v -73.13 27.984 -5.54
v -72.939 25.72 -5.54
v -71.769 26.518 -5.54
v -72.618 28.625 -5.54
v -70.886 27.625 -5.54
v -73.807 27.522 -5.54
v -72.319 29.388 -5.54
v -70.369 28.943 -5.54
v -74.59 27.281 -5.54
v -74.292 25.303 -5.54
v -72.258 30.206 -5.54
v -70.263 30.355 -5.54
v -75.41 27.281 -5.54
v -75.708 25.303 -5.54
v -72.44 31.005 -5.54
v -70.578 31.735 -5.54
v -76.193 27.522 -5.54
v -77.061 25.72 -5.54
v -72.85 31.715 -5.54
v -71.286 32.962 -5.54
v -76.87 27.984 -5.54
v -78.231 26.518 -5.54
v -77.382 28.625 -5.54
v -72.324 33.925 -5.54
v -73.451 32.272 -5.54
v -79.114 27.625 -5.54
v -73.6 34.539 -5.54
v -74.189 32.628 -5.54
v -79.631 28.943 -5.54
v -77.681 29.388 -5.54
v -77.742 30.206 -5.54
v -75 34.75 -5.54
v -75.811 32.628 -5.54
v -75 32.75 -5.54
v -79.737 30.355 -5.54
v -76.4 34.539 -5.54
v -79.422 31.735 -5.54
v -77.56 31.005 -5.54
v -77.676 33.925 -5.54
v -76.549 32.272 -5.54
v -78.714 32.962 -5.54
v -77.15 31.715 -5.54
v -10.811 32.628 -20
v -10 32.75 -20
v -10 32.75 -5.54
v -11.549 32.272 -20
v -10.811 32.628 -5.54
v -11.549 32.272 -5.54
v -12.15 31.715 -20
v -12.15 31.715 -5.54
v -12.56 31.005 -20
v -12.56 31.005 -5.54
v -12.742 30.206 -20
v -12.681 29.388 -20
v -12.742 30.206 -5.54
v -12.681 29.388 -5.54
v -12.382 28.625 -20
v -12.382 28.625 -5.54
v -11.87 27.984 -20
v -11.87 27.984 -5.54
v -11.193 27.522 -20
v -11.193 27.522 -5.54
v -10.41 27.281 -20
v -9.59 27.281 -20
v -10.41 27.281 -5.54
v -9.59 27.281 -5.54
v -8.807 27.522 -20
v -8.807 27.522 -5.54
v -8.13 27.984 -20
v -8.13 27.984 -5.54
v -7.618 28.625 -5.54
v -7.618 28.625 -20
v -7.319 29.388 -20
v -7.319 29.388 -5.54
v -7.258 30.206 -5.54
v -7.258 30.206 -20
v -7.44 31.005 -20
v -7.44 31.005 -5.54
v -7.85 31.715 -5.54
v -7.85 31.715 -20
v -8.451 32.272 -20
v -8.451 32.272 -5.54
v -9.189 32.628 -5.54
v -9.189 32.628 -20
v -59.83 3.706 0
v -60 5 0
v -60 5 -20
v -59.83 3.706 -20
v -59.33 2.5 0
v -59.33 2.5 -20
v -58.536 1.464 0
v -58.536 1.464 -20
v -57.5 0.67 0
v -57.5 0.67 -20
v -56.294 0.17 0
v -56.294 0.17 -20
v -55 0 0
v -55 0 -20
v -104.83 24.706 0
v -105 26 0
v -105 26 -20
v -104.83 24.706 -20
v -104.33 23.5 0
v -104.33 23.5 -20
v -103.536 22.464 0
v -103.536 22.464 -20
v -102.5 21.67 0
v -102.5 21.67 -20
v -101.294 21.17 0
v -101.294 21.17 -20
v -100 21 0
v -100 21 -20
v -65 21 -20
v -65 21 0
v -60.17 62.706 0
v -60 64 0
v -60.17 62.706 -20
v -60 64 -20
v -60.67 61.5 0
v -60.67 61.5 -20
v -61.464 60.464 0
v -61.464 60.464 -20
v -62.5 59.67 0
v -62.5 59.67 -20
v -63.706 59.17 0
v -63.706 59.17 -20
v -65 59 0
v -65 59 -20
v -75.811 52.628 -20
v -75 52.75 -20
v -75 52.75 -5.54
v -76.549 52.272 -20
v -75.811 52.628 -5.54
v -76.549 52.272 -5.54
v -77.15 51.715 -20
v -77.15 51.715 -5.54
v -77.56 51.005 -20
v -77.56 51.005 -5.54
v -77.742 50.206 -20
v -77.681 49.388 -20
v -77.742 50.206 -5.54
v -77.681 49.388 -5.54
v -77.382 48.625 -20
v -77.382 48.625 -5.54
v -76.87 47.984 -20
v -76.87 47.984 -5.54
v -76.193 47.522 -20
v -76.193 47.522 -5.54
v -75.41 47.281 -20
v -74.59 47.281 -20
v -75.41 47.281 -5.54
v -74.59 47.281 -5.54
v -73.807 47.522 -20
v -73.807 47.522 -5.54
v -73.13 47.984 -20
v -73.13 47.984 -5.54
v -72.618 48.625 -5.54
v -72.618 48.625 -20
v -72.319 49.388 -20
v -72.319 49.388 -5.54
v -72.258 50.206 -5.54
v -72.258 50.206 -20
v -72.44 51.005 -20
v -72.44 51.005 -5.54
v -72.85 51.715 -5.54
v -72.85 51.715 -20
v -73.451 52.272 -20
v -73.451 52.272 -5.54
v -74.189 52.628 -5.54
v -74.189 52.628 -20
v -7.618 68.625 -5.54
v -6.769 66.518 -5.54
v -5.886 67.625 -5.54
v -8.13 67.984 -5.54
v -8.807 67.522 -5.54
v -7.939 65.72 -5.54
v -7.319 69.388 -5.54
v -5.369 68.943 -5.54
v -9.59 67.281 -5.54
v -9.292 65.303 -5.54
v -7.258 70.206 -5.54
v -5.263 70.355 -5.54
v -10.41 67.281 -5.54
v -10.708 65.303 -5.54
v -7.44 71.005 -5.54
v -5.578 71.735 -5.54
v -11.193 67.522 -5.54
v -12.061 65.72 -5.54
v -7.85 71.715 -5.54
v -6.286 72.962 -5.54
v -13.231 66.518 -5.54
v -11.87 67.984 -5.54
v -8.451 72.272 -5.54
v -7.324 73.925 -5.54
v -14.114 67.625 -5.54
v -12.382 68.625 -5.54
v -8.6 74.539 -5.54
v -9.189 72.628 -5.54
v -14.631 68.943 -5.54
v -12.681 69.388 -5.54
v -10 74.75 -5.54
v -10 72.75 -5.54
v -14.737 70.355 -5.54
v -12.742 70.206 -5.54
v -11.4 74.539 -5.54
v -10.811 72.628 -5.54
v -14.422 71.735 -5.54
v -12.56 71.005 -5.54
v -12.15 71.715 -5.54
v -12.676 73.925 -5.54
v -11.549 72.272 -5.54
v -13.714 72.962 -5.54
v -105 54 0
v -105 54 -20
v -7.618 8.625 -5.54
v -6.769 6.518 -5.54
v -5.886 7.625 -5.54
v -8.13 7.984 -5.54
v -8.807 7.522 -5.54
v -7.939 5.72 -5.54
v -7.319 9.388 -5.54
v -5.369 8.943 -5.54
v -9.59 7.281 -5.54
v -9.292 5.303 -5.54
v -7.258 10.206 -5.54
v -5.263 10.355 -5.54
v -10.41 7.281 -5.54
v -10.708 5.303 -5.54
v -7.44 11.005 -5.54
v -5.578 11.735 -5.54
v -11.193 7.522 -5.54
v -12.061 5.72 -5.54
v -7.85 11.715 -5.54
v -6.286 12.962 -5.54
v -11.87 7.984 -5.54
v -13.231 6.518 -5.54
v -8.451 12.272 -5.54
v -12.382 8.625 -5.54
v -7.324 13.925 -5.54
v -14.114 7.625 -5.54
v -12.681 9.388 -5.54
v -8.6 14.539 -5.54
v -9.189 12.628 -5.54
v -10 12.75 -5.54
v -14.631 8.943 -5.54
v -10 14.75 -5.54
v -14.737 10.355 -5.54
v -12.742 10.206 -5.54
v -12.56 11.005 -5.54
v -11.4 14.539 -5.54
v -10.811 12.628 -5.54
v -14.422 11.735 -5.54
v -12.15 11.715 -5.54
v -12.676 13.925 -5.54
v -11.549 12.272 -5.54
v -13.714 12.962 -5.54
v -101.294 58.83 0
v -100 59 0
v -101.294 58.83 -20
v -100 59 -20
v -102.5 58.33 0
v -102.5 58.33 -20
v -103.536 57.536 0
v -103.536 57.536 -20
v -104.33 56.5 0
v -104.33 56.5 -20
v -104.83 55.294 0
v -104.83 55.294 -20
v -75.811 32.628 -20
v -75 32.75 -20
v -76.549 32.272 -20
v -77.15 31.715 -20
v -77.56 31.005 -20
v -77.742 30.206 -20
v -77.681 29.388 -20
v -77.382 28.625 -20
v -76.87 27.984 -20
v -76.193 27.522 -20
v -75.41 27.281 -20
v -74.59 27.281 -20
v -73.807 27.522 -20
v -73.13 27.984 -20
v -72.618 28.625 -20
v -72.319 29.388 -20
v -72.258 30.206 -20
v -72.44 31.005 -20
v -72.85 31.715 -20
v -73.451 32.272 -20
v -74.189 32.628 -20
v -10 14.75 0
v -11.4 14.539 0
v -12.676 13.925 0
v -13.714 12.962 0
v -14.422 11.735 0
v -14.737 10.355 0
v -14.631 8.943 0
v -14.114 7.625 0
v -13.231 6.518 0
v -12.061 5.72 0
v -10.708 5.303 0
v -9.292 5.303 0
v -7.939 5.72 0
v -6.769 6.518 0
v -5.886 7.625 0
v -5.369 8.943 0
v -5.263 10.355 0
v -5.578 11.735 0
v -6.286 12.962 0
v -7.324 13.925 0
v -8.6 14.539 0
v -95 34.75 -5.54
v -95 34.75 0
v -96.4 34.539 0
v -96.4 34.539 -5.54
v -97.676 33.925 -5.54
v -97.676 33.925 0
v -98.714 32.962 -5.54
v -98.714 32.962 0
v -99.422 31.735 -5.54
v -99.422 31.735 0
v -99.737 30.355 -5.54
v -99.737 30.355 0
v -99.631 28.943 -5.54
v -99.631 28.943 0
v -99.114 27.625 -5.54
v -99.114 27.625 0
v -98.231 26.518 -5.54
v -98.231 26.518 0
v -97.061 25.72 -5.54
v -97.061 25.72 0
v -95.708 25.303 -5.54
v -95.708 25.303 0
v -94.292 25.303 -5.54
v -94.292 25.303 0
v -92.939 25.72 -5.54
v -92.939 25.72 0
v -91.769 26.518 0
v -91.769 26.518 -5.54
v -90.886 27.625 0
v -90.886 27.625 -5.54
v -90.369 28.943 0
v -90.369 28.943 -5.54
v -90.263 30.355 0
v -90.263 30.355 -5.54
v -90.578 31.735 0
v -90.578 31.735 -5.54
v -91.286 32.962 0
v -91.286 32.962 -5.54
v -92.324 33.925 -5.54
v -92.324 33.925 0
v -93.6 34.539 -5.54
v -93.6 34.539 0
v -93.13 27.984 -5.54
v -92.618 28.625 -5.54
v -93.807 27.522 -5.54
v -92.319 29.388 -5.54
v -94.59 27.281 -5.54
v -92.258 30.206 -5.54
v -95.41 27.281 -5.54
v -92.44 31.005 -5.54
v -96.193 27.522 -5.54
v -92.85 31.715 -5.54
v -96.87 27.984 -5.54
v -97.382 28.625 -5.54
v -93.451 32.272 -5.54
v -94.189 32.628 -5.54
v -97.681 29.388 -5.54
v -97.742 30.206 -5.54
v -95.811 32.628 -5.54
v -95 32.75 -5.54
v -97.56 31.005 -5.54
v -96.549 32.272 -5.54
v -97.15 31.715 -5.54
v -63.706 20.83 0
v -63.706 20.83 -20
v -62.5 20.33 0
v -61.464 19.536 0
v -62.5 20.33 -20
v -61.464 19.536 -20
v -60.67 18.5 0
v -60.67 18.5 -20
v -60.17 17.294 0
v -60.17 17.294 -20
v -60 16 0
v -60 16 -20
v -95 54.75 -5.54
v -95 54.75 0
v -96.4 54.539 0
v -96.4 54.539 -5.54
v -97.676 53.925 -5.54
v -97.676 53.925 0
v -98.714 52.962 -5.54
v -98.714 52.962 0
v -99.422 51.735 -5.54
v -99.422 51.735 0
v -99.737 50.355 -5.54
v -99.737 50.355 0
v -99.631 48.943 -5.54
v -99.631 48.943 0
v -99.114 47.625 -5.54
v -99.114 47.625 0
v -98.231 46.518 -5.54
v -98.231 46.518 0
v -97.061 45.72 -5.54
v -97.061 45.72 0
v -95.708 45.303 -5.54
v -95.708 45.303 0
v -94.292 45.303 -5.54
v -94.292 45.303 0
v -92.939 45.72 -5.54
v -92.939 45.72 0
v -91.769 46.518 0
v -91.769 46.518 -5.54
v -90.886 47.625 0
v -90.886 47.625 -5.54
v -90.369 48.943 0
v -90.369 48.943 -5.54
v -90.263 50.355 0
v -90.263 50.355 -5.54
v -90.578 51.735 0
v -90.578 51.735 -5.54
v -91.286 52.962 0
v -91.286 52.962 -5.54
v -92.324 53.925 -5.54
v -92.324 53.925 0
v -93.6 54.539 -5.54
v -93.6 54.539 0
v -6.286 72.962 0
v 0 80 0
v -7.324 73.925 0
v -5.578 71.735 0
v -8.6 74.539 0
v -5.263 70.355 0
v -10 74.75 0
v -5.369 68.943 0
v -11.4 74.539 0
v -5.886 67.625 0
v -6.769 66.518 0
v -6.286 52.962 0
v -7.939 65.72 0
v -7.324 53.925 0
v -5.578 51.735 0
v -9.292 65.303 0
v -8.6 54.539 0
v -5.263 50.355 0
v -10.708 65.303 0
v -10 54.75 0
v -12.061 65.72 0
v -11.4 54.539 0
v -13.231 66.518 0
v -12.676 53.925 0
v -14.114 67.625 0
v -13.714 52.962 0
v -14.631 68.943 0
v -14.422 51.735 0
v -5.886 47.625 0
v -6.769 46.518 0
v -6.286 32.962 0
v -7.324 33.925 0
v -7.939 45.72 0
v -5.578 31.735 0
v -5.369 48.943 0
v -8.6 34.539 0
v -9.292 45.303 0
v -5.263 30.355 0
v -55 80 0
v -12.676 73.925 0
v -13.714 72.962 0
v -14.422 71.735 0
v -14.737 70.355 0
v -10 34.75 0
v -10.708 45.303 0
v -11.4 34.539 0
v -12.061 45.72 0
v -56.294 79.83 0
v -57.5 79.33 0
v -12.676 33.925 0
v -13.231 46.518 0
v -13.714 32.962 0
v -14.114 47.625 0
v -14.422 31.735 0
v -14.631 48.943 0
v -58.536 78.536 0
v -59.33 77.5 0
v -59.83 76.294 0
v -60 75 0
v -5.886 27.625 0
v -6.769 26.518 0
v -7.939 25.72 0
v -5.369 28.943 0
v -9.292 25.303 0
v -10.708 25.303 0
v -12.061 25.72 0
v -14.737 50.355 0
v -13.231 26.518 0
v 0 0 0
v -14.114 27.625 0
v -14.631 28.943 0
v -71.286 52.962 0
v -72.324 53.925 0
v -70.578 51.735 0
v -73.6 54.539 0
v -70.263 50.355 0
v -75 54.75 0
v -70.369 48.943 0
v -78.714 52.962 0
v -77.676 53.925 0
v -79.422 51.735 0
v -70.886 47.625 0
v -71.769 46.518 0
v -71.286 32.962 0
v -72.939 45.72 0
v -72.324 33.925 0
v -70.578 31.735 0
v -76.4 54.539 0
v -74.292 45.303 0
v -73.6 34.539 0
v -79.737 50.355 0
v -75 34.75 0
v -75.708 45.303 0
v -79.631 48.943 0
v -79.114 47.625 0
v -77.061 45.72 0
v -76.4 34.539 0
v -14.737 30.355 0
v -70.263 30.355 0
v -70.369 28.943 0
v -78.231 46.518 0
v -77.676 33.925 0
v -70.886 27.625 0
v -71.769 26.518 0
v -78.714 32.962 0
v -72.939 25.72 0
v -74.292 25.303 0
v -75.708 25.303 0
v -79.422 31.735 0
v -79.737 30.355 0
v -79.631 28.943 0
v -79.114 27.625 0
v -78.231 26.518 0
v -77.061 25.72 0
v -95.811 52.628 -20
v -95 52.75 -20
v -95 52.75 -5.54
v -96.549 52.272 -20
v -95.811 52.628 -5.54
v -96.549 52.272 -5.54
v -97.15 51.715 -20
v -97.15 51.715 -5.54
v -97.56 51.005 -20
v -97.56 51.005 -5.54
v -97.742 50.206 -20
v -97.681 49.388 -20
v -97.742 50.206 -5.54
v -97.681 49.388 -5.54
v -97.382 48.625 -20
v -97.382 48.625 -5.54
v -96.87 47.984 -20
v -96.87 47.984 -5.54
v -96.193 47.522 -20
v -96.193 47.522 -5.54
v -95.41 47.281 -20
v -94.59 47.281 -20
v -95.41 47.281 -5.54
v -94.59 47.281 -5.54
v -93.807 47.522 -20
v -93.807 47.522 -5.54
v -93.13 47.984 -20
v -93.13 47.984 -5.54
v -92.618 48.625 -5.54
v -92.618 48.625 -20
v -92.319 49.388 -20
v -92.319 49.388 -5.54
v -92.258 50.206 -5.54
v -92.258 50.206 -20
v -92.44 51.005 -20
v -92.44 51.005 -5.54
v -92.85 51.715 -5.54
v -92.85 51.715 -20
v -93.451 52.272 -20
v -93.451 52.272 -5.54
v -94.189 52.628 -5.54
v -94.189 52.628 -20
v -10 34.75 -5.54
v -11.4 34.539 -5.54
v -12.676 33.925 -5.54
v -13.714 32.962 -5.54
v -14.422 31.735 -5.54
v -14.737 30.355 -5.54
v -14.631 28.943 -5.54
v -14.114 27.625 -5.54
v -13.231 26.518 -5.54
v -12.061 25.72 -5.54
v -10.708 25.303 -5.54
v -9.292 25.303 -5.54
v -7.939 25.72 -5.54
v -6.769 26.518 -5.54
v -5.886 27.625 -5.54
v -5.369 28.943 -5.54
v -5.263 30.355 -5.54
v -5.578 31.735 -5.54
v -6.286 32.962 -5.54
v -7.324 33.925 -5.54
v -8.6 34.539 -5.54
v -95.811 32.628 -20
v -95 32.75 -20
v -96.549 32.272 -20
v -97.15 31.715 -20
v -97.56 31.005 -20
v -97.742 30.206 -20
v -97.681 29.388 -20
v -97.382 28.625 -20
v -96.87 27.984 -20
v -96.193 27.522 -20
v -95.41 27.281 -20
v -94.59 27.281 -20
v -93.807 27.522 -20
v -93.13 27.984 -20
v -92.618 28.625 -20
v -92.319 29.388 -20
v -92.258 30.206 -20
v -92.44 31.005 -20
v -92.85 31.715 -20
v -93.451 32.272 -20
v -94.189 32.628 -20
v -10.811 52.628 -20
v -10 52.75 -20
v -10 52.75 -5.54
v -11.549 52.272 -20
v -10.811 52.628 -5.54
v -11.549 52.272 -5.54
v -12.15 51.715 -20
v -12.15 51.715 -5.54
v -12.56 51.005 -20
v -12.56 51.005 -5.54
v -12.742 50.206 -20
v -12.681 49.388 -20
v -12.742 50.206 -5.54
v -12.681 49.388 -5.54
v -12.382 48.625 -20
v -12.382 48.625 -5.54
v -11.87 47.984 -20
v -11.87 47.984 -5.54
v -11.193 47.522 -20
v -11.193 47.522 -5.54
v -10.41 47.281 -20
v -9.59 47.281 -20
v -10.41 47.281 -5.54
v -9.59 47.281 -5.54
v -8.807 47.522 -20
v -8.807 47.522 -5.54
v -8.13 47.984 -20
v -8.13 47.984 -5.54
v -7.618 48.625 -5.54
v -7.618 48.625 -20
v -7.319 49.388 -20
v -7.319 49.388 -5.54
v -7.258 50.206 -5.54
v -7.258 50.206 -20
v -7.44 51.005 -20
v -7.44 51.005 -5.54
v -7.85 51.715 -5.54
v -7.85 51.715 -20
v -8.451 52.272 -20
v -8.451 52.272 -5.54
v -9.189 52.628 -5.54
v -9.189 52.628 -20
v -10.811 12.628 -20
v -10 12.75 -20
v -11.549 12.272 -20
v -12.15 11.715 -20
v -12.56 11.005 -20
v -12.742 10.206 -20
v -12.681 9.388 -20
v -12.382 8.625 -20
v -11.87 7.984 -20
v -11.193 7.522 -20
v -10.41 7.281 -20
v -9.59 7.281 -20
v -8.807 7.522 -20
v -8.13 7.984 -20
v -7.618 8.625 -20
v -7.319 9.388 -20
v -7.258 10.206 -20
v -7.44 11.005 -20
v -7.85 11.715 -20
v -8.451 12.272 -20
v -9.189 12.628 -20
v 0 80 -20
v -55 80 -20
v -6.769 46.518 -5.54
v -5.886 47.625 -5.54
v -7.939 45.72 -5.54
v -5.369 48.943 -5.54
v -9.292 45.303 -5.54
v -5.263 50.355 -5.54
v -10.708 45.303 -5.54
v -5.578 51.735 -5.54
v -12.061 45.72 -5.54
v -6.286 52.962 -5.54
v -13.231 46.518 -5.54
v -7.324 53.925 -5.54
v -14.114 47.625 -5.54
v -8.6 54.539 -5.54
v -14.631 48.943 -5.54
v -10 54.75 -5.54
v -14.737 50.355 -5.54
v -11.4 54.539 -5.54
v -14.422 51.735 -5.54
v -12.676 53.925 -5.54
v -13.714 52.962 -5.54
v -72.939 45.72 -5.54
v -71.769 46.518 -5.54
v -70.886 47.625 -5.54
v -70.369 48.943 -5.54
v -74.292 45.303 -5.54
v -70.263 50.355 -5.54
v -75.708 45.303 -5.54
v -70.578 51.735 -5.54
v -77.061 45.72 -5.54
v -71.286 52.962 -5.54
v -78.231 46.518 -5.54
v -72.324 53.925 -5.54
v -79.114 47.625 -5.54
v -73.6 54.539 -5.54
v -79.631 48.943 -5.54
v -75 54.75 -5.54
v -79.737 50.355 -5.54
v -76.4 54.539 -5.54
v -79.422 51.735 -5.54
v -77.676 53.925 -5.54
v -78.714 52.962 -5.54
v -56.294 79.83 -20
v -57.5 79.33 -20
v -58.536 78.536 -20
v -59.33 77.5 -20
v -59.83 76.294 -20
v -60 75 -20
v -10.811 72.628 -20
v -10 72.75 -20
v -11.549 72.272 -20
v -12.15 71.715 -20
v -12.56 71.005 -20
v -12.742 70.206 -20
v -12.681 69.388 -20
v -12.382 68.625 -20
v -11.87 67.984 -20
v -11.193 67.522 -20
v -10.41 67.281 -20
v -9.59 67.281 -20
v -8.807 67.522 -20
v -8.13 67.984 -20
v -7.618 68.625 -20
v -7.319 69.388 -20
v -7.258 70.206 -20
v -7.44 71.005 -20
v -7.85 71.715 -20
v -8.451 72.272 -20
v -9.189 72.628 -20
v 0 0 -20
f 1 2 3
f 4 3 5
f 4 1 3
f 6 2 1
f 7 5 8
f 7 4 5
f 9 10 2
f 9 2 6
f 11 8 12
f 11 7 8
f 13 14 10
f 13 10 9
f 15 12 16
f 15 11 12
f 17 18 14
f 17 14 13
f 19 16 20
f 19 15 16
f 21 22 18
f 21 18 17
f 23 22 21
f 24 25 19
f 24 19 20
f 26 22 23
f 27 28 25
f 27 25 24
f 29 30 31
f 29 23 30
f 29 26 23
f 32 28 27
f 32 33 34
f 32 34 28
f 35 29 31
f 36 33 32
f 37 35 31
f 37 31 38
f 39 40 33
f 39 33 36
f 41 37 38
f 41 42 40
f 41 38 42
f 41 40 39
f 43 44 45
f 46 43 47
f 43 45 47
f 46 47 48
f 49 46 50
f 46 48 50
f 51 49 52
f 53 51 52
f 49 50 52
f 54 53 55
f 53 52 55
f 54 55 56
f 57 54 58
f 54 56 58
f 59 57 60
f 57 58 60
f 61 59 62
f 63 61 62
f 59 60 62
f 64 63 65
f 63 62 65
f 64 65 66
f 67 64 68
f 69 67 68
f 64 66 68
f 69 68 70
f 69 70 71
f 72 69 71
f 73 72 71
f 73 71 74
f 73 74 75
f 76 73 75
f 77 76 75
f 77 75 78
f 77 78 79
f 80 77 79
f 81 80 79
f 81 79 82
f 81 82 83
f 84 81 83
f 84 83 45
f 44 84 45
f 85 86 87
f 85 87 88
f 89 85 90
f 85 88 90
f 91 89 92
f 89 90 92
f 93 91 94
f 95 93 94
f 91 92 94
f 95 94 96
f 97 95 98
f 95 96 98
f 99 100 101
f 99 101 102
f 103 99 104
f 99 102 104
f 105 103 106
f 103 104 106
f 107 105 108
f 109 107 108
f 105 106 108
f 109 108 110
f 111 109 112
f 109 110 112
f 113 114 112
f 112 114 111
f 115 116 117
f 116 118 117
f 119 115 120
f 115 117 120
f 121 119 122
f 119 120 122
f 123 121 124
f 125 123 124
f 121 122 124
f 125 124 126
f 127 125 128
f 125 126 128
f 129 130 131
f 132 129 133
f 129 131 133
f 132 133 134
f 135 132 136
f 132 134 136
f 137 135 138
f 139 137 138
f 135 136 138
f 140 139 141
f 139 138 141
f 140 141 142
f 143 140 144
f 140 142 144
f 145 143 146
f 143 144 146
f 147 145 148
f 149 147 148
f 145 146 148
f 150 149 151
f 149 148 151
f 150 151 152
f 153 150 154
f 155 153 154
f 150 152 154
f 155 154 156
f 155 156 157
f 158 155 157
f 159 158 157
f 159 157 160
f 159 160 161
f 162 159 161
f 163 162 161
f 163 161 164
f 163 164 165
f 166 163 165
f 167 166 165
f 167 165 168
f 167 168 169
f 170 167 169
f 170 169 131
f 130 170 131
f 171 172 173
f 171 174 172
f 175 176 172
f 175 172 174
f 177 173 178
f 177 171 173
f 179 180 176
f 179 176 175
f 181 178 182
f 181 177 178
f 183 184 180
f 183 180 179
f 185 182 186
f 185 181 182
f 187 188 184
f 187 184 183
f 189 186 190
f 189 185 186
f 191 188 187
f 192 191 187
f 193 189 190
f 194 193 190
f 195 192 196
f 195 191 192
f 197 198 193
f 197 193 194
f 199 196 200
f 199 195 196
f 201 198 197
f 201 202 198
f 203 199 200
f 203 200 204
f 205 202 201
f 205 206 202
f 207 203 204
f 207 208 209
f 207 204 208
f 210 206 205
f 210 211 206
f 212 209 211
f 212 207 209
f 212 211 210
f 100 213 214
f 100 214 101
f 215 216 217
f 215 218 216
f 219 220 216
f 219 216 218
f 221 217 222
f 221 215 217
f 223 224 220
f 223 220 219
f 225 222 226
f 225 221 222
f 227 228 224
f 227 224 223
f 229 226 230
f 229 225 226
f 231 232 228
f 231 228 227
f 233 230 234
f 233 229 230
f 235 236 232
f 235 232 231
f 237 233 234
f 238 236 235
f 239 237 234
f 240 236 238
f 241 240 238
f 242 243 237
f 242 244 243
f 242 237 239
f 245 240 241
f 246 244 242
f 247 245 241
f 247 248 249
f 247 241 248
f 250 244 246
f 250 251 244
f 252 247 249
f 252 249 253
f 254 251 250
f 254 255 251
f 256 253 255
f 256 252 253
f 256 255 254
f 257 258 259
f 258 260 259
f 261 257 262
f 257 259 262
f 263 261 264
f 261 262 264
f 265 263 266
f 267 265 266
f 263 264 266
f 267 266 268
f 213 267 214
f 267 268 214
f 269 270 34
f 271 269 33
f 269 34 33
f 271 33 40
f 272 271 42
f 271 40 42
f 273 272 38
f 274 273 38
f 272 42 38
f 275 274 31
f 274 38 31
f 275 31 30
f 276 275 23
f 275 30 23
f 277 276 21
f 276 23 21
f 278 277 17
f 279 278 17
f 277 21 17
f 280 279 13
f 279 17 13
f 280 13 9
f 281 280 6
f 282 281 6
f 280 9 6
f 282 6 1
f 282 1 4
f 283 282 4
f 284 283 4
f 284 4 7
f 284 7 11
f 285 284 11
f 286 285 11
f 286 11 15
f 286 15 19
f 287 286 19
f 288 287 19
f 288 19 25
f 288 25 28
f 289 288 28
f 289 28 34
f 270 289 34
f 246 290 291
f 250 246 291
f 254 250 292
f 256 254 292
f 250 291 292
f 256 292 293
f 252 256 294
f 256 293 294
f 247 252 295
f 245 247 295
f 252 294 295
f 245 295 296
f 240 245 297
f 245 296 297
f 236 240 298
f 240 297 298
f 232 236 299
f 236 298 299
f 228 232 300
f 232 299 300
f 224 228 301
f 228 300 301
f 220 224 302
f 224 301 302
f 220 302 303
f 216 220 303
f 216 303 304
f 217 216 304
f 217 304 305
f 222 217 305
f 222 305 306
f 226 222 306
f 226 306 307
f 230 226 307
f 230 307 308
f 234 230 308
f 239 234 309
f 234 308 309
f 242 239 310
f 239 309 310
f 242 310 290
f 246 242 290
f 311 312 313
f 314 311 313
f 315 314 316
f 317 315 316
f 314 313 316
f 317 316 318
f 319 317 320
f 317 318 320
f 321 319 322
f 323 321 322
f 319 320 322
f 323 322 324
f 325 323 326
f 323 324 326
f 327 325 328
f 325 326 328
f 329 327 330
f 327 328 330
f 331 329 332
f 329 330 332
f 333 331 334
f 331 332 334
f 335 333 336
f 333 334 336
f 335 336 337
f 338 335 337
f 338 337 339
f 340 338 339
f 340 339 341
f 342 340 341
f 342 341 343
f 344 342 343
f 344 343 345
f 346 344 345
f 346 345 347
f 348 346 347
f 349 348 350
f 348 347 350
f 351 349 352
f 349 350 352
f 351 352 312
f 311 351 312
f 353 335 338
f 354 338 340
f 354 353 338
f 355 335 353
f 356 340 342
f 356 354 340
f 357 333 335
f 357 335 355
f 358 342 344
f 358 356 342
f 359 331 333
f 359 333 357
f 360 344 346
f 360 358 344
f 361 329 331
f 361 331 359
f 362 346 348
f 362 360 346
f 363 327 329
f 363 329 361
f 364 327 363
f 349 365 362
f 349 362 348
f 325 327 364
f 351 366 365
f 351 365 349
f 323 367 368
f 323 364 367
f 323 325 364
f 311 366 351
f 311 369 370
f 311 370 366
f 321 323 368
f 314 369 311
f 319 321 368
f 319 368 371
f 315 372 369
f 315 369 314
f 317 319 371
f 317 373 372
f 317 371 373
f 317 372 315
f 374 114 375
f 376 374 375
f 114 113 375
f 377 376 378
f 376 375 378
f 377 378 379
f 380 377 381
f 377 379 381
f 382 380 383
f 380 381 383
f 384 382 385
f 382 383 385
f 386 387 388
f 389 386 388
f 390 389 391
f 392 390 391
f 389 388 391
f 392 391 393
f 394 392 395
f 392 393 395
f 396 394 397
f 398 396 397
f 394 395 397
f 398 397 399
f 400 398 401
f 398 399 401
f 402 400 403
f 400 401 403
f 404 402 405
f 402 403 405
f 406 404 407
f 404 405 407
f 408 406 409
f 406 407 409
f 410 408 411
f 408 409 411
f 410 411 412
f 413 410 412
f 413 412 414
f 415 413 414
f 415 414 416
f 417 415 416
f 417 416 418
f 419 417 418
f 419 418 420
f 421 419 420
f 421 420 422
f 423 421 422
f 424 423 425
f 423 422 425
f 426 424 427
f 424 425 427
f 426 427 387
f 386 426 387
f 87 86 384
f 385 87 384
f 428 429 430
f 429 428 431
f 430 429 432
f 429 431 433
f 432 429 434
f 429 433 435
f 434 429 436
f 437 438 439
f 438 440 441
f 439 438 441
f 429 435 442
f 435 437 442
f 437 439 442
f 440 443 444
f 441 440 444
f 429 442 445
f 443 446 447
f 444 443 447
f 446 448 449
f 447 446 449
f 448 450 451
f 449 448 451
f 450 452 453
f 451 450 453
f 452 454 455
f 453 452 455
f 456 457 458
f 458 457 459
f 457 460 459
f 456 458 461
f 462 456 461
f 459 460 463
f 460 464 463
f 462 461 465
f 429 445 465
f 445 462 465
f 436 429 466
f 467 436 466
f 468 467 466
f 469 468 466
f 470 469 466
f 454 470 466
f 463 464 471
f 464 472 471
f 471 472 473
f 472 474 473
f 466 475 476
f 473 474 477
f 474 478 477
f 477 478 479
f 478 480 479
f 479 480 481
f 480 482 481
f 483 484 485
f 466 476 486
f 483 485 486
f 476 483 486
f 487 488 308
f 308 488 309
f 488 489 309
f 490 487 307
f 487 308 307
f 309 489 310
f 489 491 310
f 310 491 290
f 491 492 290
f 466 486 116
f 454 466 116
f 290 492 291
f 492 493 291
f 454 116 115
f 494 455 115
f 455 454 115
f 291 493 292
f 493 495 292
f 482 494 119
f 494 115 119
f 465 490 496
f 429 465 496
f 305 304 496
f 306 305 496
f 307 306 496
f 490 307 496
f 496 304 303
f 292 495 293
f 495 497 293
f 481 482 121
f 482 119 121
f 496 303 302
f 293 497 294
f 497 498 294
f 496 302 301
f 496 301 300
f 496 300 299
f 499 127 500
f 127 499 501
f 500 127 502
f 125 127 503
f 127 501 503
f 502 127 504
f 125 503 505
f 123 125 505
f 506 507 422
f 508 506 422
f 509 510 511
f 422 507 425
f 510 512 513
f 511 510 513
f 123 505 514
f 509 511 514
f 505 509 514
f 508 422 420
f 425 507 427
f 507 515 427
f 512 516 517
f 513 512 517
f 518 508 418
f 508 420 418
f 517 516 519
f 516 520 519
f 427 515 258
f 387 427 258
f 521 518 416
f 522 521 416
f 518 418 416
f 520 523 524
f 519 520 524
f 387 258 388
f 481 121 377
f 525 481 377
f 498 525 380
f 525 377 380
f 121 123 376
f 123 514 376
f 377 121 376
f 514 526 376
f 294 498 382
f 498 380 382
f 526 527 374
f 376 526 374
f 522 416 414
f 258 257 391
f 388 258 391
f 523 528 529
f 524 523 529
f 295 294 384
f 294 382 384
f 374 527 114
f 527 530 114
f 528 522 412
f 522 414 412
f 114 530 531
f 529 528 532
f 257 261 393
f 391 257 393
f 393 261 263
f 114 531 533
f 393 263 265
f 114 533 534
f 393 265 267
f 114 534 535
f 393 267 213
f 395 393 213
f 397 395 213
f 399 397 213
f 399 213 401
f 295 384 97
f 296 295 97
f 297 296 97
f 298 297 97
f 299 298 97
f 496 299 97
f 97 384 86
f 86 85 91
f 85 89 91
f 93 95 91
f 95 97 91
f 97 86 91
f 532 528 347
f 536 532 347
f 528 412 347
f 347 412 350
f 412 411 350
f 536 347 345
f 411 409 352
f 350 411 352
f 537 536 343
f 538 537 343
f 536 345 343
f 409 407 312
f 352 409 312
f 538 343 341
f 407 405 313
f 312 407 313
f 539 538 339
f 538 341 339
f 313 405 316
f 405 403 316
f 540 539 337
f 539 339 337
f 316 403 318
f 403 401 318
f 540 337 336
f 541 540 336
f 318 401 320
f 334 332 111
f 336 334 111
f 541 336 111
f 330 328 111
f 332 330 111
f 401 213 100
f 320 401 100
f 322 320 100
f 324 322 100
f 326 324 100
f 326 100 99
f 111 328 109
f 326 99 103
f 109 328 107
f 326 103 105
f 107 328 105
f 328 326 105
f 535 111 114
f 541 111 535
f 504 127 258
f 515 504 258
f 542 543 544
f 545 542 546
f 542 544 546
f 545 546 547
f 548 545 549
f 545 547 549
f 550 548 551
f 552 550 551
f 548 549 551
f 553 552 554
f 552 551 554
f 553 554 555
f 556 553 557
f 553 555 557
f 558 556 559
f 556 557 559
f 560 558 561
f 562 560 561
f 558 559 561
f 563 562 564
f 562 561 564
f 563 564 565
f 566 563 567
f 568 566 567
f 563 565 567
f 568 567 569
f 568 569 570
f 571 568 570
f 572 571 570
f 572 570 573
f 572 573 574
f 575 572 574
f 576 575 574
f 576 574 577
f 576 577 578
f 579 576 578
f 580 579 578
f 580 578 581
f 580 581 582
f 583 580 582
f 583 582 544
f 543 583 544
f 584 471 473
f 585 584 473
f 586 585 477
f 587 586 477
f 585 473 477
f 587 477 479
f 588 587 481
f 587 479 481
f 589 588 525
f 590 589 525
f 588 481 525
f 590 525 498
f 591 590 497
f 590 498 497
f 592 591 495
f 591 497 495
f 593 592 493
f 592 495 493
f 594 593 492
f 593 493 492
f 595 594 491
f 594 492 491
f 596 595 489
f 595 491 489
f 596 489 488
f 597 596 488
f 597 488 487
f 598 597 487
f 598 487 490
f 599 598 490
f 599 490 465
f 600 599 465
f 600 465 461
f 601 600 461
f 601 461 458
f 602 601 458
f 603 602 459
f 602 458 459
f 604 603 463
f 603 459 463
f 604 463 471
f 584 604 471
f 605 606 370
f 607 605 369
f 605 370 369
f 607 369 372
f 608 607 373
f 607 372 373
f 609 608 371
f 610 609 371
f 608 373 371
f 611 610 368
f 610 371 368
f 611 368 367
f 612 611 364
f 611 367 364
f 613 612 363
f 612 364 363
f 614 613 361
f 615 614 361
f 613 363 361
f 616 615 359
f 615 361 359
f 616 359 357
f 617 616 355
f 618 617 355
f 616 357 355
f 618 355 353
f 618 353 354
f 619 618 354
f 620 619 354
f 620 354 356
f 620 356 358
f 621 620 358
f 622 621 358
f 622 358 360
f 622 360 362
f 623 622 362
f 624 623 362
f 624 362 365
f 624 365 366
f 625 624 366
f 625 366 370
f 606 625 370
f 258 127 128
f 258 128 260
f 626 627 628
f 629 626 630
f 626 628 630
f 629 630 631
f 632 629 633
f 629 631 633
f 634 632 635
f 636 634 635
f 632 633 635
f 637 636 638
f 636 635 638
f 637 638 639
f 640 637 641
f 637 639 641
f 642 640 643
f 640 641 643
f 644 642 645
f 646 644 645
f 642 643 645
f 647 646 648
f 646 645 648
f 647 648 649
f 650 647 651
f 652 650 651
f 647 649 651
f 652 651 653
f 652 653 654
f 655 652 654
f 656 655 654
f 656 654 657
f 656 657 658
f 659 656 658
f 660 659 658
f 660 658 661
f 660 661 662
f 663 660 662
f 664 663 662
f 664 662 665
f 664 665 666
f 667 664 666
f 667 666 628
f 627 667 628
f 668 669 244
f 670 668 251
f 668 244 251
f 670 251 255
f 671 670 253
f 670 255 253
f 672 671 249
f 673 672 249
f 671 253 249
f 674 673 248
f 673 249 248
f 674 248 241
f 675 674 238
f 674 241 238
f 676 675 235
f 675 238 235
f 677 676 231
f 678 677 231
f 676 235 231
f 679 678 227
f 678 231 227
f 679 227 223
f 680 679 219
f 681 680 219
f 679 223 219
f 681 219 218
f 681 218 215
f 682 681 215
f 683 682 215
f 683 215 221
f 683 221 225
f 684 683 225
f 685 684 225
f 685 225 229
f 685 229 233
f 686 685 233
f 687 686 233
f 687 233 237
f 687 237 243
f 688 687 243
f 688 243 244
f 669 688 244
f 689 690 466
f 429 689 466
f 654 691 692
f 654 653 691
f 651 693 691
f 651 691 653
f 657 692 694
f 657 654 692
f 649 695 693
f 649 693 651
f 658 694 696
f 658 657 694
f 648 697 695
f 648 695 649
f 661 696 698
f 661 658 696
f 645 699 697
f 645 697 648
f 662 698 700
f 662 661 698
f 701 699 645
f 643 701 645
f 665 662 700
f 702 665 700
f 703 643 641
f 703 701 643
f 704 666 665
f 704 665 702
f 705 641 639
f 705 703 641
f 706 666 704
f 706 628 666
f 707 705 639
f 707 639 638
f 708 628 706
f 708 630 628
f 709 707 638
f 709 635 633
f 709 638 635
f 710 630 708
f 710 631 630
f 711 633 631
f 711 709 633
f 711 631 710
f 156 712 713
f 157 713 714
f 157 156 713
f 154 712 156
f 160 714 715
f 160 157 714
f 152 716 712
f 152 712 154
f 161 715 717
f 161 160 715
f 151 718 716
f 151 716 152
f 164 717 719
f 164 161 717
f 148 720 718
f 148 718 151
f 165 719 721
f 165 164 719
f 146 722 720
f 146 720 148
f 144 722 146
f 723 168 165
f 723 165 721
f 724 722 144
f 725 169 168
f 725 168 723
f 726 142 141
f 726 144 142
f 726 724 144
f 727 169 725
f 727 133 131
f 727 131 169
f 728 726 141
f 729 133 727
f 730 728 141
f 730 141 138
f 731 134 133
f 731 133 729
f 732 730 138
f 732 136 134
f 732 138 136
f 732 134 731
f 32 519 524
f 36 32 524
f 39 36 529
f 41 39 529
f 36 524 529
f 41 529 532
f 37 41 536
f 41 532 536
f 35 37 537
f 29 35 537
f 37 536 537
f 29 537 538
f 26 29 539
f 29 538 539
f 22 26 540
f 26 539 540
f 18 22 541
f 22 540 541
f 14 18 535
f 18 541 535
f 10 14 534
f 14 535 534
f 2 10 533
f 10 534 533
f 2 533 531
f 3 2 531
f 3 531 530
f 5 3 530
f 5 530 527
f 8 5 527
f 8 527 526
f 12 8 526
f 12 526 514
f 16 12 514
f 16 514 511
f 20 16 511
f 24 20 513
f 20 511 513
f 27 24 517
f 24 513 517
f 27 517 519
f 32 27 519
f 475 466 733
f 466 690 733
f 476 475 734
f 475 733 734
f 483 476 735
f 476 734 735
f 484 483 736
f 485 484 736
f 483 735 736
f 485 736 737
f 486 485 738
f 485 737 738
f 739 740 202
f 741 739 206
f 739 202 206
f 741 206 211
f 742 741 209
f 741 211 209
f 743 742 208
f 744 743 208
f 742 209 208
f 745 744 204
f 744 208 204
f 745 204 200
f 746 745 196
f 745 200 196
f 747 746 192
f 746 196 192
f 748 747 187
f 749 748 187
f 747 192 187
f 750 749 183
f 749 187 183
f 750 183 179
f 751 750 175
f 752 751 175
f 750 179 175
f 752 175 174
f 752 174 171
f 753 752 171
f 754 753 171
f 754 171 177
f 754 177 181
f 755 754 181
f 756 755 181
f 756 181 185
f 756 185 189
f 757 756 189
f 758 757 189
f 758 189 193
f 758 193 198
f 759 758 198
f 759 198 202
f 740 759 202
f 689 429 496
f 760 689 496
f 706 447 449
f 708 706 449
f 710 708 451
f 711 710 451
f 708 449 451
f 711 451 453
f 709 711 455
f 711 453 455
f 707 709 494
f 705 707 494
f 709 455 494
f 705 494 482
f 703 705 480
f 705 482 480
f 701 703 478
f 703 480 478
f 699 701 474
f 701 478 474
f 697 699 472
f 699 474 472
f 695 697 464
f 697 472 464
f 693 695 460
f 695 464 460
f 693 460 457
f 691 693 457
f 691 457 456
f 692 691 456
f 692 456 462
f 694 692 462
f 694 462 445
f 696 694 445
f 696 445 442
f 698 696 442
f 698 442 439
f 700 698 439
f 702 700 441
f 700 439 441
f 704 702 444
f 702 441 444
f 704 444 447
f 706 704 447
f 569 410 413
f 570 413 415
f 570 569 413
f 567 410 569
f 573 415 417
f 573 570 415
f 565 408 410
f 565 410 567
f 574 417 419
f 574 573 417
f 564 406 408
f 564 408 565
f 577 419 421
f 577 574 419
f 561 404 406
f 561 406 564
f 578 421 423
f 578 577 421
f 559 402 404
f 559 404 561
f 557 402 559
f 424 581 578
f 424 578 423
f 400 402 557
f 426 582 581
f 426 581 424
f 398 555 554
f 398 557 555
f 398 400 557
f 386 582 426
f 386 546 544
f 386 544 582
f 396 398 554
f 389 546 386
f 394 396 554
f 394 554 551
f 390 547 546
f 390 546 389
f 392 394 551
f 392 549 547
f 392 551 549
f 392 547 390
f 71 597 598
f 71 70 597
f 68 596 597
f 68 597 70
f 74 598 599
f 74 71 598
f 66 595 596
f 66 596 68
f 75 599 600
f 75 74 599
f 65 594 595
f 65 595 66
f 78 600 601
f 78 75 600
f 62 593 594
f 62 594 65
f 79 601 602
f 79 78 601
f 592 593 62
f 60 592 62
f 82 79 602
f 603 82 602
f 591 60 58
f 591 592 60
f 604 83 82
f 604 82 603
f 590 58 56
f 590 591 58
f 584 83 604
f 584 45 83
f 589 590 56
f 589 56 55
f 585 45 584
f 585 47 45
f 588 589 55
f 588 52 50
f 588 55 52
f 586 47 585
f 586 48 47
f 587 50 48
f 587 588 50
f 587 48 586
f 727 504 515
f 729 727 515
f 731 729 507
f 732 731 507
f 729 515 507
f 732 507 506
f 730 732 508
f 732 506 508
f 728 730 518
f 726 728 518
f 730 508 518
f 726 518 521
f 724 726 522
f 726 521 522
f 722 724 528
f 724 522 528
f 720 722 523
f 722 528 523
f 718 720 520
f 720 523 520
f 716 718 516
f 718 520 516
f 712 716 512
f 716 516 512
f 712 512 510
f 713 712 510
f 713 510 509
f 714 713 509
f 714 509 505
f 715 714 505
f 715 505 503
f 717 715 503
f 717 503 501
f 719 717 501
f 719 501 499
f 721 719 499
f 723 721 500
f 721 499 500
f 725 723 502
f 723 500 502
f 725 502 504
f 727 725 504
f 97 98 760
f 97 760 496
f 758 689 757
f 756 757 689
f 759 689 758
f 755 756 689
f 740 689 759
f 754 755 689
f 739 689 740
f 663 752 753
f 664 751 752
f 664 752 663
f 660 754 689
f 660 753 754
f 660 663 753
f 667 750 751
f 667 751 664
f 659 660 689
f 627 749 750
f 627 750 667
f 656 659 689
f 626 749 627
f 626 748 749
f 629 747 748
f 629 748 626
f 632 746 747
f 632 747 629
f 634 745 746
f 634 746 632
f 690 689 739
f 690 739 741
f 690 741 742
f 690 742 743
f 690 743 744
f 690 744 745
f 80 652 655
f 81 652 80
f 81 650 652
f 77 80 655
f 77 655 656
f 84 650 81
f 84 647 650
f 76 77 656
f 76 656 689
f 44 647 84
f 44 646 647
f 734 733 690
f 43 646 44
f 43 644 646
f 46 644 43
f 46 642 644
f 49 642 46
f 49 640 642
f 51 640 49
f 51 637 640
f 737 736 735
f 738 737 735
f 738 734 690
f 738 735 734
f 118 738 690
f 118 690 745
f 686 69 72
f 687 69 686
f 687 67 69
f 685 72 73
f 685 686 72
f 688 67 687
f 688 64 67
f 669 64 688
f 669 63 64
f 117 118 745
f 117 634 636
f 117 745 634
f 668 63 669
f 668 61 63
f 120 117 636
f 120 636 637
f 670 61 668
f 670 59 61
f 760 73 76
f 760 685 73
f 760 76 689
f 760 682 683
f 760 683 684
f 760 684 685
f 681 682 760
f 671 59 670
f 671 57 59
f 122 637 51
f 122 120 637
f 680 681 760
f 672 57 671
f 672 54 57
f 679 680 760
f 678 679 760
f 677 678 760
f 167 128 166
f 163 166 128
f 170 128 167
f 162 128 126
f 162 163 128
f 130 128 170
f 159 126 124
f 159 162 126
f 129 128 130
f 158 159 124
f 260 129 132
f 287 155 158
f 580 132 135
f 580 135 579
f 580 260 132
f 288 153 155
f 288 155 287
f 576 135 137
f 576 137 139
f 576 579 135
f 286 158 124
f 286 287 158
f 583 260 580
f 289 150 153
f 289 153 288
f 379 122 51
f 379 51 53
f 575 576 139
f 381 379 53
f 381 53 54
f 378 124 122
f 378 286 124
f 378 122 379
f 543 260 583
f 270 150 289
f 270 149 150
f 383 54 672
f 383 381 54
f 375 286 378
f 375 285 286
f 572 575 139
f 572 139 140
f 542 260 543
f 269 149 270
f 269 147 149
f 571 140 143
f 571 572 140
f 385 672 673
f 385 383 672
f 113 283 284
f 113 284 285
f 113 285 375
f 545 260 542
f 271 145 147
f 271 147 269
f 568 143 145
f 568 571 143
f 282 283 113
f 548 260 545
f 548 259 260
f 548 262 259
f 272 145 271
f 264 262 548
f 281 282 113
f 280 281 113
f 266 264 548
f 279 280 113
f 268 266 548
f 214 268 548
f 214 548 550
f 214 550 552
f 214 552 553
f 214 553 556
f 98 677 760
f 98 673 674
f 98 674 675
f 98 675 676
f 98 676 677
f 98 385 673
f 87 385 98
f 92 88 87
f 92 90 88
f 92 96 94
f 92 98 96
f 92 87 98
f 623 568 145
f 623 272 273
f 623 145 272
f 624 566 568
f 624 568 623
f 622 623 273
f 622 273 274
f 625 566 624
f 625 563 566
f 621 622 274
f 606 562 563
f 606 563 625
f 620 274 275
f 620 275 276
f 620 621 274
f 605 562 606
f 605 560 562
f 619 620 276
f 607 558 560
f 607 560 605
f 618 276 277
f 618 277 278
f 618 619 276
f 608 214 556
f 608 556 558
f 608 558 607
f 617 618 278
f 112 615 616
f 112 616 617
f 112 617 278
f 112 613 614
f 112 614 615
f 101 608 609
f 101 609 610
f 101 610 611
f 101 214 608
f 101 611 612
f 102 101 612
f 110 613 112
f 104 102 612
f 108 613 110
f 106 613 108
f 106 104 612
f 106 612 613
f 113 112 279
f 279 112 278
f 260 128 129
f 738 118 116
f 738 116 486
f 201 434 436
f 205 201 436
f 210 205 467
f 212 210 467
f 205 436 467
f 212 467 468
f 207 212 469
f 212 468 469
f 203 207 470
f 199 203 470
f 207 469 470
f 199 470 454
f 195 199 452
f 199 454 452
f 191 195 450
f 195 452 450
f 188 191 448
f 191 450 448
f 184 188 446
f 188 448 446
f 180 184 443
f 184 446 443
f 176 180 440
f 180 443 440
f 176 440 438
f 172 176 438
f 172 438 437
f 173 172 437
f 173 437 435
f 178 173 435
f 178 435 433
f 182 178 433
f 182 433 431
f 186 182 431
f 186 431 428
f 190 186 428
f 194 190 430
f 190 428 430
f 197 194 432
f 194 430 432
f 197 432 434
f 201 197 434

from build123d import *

# Parameters (mm, degrees)
SKETCH_W              = 80
SKETCH_H              = 20
PAD_DEPTH             = 52.5
SKETCH001_R           = 2.75
POCKET_DEPTH          = 20.001
SKETCH002_R           = 4.75
POCKET001_DEPTH       = 5.54
SKETCH003_W           = 21
SKETCH003_H           = 45
POCKET002_DEPTH       = 20.001
FILLET_R              = 5
CLONE_PLACEMENT_ANGLE = 90


with BuildPart() as part:
    # Sketch → Pad (new body, symmetric)
    with BuildSketch(Plane.XZ):
        with Locations((0, -10)):
            Rectangle(SKETCH_W, SKETCH_H)
    extrude(amount=PAD_DEPTH, both=True)

    # Sketch001 (on Face4 of Pad) → Pocket (cut, through all)
    with BuildSketch(Plane(origin=(0, 0, 0), x_dir=(-1, 0, 0), z_dir=(0, 0, 1))):
        with Locations((-30, -42.5)):
            Circle(SKETCH001_R)
        with Locations((30, -42.5)):
            Circle(SKETCH001_R)
        with Locations((-10, 42.5)):
            Circle(SKETCH001_R)
        with Locations((10, 42.5)):
            Circle(SKETCH001_R)
        with Locations((-10, 22.5)):
            Circle(SKETCH001_R)
        with Locations((10, 22.5)):
            Circle(SKETCH001_R)
        with Locations((-10, -42.5)):
            Circle(SKETCH001_R)
        with Locations((10, -42.5)):
            Circle(SKETCH001_R)
    extrude(amount=-POCKET_DEPTH, mode=Mode.SUBTRACT)

    # Sketch002 (on Face2 of Pocket) → Pocket001 (cut)
    with BuildSketch(Plane(origin=(0, 0, 0), x_dir=(-1, 0, 0), z_dir=(0, 0, 1))):
        with Locations((-10, 42.5)):
            Circle(SKETCH002_R)
        with Locations((10, 42.5)):
            Circle(SKETCH002_R)
        with Locations((-10, 22.5)):
            Circle(SKETCH002_R)
        with Locations((10, 22.5)):
            Circle(SKETCH002_R)
        with Locations((10, -42.5)):
            Circle(SKETCH002_R)
        with Locations((30, -42.5)):
            Circle(SKETCH002_R)
        with Locations((-30, -42.5)):
            Circle(SKETCH002_R)
        with Locations((-10, -42.5)):
            Circle(SKETCH002_R)
    extrude(amount=-POCKET001_DEPTH, mode=Mode.SUBTRACT)

    # Sketch003 (on Face2 of Pocket001) → Pocket002 (cut, through all)
    with BuildSketch(Plane(origin=(0, 0, 0), x_dir=(-1, 0, 0), z_dir=(0, 0, 1))):
        with Locations((-29.5, 30)):
            Rectangle(SKETCH003_W, SKETCH003_H)
        with Locations((29.5, 30)):
            Rectangle(SKETCH003_W, SKETCH003_H)
    extrude(amount=-POCKET002_DEPTH, mode=Mode.SUBTRACT)

    # Fillet
    fillet_edges = [part.edges().sort_by_distance(p)[0] for p in [
        (40, -7.5, -10),
        (19, -7.5, -10),
        (19, -52.5, -10),
        (-19, -52.5, -10),
        (-19, -7.5, -10),
        (-40, -7.5, -10),
    ]]
    fillet(fillet_edges, radius=FILLET_R)


with BuildPart() as part_1:
    # Clone placement: moved
    add(part.part.moved(Location((-52.5, 40, 0))).rotate(Axis((-52.5, 40, 0), (0, 0, -1)), CLONE_PLACEMENT_ANGLE))


solid = part_1.part
